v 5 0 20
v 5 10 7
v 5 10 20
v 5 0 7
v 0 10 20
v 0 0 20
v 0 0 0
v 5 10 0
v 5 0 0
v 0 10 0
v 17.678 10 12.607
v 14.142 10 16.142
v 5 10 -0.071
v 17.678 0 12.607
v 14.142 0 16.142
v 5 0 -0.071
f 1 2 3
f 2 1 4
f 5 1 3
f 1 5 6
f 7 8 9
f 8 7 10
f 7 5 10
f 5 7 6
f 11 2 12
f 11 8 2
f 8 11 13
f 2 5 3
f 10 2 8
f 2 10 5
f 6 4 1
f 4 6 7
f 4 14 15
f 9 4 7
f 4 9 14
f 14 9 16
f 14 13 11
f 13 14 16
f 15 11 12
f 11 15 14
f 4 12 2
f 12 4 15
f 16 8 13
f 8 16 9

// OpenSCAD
// [x, y, z]

difference() {
    union() {
        cube([5, 10, 20]);
        translate([0, 0, 2]) {
            rotate([0, 45, 0]) {
                cube([5, 10, 20]);
            }
        }
    }

    // cut object
    union() { 
        translate([-5, 0, 0]) {
            cube([5, 10, 20]);
        }
        translate([-5, 0, -3]) {
            cube([10, 10, 3]);
        }
    }
}
